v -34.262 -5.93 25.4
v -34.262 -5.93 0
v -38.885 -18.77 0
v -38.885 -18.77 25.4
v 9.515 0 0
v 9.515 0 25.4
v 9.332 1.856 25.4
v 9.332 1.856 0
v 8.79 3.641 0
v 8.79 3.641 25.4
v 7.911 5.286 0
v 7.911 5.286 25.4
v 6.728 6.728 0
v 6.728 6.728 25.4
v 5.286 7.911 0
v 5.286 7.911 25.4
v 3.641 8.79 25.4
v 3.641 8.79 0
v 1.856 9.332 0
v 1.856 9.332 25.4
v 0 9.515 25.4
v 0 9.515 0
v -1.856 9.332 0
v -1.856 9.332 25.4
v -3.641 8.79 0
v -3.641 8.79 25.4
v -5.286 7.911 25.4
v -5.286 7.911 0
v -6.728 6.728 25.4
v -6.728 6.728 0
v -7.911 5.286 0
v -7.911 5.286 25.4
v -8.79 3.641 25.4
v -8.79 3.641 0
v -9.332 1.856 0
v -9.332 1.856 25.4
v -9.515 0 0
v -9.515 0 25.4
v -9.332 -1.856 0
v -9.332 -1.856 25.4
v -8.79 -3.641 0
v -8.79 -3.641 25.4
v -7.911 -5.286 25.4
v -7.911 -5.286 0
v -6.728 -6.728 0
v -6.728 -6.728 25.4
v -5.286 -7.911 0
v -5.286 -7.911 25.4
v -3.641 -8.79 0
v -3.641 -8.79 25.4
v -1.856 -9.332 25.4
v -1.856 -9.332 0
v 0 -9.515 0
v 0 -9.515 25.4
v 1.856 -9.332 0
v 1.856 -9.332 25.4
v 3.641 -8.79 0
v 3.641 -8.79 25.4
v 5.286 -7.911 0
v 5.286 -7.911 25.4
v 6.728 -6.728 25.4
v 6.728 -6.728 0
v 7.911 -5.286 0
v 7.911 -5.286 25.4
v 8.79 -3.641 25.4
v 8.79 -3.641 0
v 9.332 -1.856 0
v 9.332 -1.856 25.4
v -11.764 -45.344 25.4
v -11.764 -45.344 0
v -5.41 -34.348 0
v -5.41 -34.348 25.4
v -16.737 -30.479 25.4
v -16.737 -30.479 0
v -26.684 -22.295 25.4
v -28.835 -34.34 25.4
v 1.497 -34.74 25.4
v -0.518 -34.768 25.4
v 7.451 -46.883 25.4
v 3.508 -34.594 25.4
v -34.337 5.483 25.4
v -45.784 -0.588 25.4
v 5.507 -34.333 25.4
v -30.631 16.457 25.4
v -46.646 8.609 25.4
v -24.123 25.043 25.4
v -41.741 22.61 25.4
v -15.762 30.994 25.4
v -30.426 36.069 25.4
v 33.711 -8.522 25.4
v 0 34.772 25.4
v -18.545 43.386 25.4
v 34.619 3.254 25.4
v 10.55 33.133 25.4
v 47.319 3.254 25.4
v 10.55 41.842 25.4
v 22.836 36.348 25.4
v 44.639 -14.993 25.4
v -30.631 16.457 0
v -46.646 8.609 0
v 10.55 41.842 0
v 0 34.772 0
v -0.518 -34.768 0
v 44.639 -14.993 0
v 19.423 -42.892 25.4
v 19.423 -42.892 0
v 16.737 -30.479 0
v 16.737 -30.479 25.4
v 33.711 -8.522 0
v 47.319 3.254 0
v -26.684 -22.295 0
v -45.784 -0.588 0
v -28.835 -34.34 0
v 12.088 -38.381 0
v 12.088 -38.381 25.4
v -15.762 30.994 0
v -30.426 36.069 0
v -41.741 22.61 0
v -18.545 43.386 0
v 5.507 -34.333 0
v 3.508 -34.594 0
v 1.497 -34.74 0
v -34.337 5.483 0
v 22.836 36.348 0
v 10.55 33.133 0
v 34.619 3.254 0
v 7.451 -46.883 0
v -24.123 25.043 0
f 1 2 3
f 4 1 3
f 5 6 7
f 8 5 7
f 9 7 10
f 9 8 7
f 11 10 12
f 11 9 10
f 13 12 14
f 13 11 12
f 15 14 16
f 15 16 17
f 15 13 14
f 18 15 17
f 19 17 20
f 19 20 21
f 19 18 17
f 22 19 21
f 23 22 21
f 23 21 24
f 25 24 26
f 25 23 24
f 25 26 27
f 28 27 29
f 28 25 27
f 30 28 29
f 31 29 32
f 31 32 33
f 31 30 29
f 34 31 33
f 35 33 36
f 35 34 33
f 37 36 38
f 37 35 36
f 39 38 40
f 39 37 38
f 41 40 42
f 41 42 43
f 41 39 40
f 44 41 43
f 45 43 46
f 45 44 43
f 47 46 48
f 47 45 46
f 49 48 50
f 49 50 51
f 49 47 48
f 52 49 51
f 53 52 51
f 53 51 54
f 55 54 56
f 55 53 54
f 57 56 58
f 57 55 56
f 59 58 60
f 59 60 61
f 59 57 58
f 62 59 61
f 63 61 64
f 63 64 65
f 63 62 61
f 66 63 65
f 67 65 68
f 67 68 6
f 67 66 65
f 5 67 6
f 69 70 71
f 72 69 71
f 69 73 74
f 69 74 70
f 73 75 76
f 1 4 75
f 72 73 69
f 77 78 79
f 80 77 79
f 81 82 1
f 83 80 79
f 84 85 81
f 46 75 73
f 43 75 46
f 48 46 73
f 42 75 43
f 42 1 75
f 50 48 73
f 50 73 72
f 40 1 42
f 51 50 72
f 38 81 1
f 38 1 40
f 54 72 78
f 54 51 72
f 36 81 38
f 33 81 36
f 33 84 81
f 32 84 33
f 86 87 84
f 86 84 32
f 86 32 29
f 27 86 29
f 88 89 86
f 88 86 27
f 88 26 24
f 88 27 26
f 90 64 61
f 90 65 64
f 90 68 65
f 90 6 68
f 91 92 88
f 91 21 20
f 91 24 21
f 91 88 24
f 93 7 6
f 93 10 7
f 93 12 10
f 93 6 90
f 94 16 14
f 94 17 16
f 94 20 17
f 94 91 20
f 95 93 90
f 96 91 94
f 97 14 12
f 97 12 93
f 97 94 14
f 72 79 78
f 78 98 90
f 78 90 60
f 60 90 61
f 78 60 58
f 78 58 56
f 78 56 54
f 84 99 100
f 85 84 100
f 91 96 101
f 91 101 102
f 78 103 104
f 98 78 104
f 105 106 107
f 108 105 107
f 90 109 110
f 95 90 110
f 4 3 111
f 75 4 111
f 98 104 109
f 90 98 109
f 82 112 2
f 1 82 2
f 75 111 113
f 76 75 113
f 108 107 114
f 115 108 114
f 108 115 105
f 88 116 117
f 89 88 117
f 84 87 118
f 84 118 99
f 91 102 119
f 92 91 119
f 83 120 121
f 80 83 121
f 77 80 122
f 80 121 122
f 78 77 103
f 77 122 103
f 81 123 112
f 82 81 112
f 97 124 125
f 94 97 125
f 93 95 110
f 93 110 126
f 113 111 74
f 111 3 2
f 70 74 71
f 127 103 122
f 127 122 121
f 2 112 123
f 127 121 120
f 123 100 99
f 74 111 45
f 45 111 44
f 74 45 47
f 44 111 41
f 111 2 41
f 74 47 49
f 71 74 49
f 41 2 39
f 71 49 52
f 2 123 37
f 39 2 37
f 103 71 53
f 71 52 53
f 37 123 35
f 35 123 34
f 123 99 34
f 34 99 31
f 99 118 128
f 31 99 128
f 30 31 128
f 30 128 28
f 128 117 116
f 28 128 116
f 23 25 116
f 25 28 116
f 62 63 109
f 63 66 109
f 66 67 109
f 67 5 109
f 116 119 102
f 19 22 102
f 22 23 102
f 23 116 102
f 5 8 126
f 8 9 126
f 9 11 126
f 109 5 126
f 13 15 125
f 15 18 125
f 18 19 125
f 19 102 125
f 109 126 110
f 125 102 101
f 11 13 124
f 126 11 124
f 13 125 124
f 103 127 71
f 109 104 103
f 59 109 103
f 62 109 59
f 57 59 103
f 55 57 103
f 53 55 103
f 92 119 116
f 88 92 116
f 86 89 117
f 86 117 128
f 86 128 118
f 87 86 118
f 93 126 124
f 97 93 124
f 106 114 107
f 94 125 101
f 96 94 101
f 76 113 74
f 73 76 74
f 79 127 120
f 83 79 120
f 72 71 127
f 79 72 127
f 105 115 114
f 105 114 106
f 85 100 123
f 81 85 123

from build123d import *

# Parameters (mm, degrees)
F0_R     = 9.5147098481
F1_DEPTH = 25.4


with BuildPart() as f1:
    # F0 (on Top) → F1 (new body)
    with BuildSketch(Plane.XY):
        with BuildLine():
            ThreePointArc((33.7113661444, -8.521701965), (34.5056466306, -4.2937119493), (34.7717645756, 0))
            ThreePointArc((34.7717645756, 0), (34.7335993542, 1.6287073412), (34.6191874697, 3.253839369))
            Line((34.6191874697, 3.253839369), (28.8855670333, 19.357159628))
            ThreePointArc((28.8855670333, 19.357159628), (20.8860262727, 27.8001711908), (10.5496581318, 33.1327681458))
            ThreePointArc((10.5496581318, 33.1327681458), (5.3381081878, 34.3595723588), (4.9e-09, 34.7717645756))
            ThreePointArc((4.9e-09, 34.7717645756), (-8.1039598603, 33.8142195871), (-15.7615859684, 30.9943223746))
            ThreePointArc((-15.7615859684, 30.9943223746), (-20.1633398845, 28.3287016364), (-24.123479709, 25.0426304216))
            ThreePointArc((-24.123479709, 25.0426304216), (-27.7114808583, 21.003557802), (-30.630509106, 16.457445841))
            ThreePointArc((-30.630509106, 16.457445841), (-32.9437975869, 11.1257274932), (-34.3367194248, 5.4831843706))
            ThreePointArc((-34.3367194248, 5.4831843706), (-34.7710267297, -0.2265212223), (-34.2623659277, -5.930083704))
            ThreePointArc((-34.2623659277, -5.930083704), (-31.5524748858, -14.6122188692), (-26.6838149969, -22.2946098623))
            ThreePointArc((-26.6838149969, -22.2946098623), (-22.0925138505, -26.851376938), (-16.7366261479, -30.47886082))
            ThreePointArc((-16.7366261479, -30.47886082), (-11.2410746557, -32.9046174919), (-5.4100284558, -34.348321703))
            ThreePointArc((-5.4100284558, -34.348321703), (-2.9714241062, -34.6445702886), (-0.5179892362, -34.7679061615))
            Line((-0.5179892362, -34.7679061615), (25.9024363536, -23.1978318524))
            ThreePointArc((25.9024363536, -23.1978318524), (30.6968819131, -16.3333111315), (33.7113661444, -8.521701965))
        make_face()
        Circle(F0_R, mode=Mode.SUBTRACT)
        with BuildLine():
            Line((-45.7841467777, -0.5879337581), (-34.2623659277, -5.930083704))
            ThreePointArc((-34.2623659277, -5.930083704), (-34.7710267297, -0.2265212223), (-34.3367194248, 5.4831843706))
            Line((-34.3367194248, 5.4831843706), (-45.7841467777, -0.5879337581))
        make_face()
        with BuildLine():
            Line((-38.8848297568, -18.7696646387), (-26.6838149969, -22.2946098623))
            ThreePointArc((-26.6838149969, -22.2946098623), (-31.5524748858, -14.6122188692), (-34.2623659277, -5.930083704))
            Line((-34.2623659277, -5.930083704), (-38.8848297568, -18.7696646387))
        make_face()
        with BuildLine():
            Line((-28.8354200673, -34.3401022908), (-16.7366261479, -30.47886082))
            ThreePointArc((-16.7366261479, -30.47886082), (-22.0925138505, -26.851376938), (-26.6838149969, -22.2946098623))
            Line((-26.6838149969, -22.2946098623), (-28.8354200673, -34.3401022908))
        make_face()
        with BuildLine():
            Line((-11.7643075513, -45.344372684), (-5.4100284558, -34.348321703))
            ThreePointArc((-5.4100284558, -34.348321703), (-11.2410746557, -32.9046174919), (-16.7366261479, -30.47886082))
            Line((-16.7366261479, -30.47886082), (-11.7643075513, -45.344372684))
        make_face()
        with BuildLine():
            ThreePointArc((5.5066084769, -34.3329706665), (2.5037716955, -34.6815042782), (-0.5179892362, -34.7679061615))
            Line((-0.5179892362, -34.7679061615), (6.1559116798, -38.5238970706))
            Line((6.1559116798, -38.5238970706), (5.5066084769, -34.3329706665))
        make_face()
        with BuildLine():
            Line((6.1559116798, -38.5238970706), (-0.5179892362, -34.7679061615))
            ThreePointArc((-0.5179892362, -34.7679061615), (-2.9714241062, -34.6445702886), (-5.4100284558, -34.348321703))
            Line((-5.4100284558, -34.348321703), (7.4510303863, -46.8832385297))
            Line((7.4510303863, -46.8832385297), (6.1559116798, -38.5238970706))
        make_face()
        with BuildLine():
            Line((44.63919633, -14.992600468), (33.7113661444, -8.521701965))
            ThreePointArc((33.7113661444, -8.521701965), (30.6968819131, -16.3333111315), (25.9024363536, -23.1978318524))
            Line((25.9024363536, -23.1978318524), (44.63919633, -14.992600468))
        make_face()
        with BuildLine():
            ThreePointArc((34.6191874697, 3.253839369), (34.7335993542, 1.6287073412), (34.7717645756, 0))
            ThreePointArc((34.7717645756, 0), (34.5056466306, -4.2937119493), (33.7113661444, -8.521701965))
            Line((33.7113661444, -8.521701965), (47.3191874697, 3.253839369))
            Line((47.3191874697, 3.253839369), (34.6191874697, 3.253839369))
        make_face()
        with BuildLine():
            ThreePointArc((10.5496581318, 33.1327681458), (20.8860262727, 27.8001711908), (28.8855670333, 19.357159628))
            Line((28.8855670333, 19.357159628), (22.8358637772, 36.3482231429))
            Line((22.8358637772, 36.3482231429), (10.5496581318, 33.1327681458))
        make_face()
        with BuildLine():
            ThreePointArc((4.9e-09, 34.7717645756), (5.3381081878, 34.3595723588), (10.5496581318, 33.1327681458))
            Line((10.5496581318, 33.1327681458), (10.5496581218, 41.8424585666))
            Line((10.5496581218, 41.8424585666), (0, 34.7717645756))
        make_face()
        with BuildLine():
            ThreePointArc((-15.7615859684, 30.9943223746), (-8.1039598603, 33.8142195871), (4.9e-09, 34.7717645756))
            Line((0, 34.7717645756), (-18.5446361736, 43.3856351201))
            Line((-18.5446361736, 43.3856351201), (-15.7615859684, 30.9943223746))
        make_face()
        with BuildLine():
            ThreePointArc((-24.123479709, 25.0426304216), (-20.1633398845, 28.3287016364), (-15.7615859684, 30.9943223746))
            Line((-15.7615859684, 30.9943223746), (-30.4257869342, 36.0685509564))
            Line((-30.4257869342, 36.0685509564), (-24.123479709, 25.0426304216))
        make_face()
        with BuildLine():
            ThreePointArc((-30.630509106, 16.457445841), (-27.7114808583, 21.003557802), (-24.123479709, 25.0426304216))
            Line((-24.123479709, 25.0426304216), (-41.7405566495, 22.6102373684))
            Line((-41.7405566495, 22.6102373684), (-30.630509106, 16.457445841))
        make_face()
        with BuildLine():
            ThreePointArc((-34.3367194248, 5.4831843706), (-32.9437975869, 11.1257274932), (-30.630509106, 16.457445841))
            Line((-30.630509106, 16.457445841), (-46.6459102761, 8.6094953897))
            Line((-46.6459102761, 8.6094953897), (-34.3367194248, 5.4831843706))
        make_face()
    extrude(amount=F1_DEPTH)


with BuildPart() as f1b:
    # F0 (on Top) → F1, piece 2 (new body)
    with BuildSketch(Plane.XY):
        Polygon((19.4229201156, -42.8915085923), (16.7366261479, -30.47886082), (12.0884100824, -38.3807816184), align=None)
    extrude(amount=F1_DEPTH)


solid = Compound([f1.part, f1b.part])
